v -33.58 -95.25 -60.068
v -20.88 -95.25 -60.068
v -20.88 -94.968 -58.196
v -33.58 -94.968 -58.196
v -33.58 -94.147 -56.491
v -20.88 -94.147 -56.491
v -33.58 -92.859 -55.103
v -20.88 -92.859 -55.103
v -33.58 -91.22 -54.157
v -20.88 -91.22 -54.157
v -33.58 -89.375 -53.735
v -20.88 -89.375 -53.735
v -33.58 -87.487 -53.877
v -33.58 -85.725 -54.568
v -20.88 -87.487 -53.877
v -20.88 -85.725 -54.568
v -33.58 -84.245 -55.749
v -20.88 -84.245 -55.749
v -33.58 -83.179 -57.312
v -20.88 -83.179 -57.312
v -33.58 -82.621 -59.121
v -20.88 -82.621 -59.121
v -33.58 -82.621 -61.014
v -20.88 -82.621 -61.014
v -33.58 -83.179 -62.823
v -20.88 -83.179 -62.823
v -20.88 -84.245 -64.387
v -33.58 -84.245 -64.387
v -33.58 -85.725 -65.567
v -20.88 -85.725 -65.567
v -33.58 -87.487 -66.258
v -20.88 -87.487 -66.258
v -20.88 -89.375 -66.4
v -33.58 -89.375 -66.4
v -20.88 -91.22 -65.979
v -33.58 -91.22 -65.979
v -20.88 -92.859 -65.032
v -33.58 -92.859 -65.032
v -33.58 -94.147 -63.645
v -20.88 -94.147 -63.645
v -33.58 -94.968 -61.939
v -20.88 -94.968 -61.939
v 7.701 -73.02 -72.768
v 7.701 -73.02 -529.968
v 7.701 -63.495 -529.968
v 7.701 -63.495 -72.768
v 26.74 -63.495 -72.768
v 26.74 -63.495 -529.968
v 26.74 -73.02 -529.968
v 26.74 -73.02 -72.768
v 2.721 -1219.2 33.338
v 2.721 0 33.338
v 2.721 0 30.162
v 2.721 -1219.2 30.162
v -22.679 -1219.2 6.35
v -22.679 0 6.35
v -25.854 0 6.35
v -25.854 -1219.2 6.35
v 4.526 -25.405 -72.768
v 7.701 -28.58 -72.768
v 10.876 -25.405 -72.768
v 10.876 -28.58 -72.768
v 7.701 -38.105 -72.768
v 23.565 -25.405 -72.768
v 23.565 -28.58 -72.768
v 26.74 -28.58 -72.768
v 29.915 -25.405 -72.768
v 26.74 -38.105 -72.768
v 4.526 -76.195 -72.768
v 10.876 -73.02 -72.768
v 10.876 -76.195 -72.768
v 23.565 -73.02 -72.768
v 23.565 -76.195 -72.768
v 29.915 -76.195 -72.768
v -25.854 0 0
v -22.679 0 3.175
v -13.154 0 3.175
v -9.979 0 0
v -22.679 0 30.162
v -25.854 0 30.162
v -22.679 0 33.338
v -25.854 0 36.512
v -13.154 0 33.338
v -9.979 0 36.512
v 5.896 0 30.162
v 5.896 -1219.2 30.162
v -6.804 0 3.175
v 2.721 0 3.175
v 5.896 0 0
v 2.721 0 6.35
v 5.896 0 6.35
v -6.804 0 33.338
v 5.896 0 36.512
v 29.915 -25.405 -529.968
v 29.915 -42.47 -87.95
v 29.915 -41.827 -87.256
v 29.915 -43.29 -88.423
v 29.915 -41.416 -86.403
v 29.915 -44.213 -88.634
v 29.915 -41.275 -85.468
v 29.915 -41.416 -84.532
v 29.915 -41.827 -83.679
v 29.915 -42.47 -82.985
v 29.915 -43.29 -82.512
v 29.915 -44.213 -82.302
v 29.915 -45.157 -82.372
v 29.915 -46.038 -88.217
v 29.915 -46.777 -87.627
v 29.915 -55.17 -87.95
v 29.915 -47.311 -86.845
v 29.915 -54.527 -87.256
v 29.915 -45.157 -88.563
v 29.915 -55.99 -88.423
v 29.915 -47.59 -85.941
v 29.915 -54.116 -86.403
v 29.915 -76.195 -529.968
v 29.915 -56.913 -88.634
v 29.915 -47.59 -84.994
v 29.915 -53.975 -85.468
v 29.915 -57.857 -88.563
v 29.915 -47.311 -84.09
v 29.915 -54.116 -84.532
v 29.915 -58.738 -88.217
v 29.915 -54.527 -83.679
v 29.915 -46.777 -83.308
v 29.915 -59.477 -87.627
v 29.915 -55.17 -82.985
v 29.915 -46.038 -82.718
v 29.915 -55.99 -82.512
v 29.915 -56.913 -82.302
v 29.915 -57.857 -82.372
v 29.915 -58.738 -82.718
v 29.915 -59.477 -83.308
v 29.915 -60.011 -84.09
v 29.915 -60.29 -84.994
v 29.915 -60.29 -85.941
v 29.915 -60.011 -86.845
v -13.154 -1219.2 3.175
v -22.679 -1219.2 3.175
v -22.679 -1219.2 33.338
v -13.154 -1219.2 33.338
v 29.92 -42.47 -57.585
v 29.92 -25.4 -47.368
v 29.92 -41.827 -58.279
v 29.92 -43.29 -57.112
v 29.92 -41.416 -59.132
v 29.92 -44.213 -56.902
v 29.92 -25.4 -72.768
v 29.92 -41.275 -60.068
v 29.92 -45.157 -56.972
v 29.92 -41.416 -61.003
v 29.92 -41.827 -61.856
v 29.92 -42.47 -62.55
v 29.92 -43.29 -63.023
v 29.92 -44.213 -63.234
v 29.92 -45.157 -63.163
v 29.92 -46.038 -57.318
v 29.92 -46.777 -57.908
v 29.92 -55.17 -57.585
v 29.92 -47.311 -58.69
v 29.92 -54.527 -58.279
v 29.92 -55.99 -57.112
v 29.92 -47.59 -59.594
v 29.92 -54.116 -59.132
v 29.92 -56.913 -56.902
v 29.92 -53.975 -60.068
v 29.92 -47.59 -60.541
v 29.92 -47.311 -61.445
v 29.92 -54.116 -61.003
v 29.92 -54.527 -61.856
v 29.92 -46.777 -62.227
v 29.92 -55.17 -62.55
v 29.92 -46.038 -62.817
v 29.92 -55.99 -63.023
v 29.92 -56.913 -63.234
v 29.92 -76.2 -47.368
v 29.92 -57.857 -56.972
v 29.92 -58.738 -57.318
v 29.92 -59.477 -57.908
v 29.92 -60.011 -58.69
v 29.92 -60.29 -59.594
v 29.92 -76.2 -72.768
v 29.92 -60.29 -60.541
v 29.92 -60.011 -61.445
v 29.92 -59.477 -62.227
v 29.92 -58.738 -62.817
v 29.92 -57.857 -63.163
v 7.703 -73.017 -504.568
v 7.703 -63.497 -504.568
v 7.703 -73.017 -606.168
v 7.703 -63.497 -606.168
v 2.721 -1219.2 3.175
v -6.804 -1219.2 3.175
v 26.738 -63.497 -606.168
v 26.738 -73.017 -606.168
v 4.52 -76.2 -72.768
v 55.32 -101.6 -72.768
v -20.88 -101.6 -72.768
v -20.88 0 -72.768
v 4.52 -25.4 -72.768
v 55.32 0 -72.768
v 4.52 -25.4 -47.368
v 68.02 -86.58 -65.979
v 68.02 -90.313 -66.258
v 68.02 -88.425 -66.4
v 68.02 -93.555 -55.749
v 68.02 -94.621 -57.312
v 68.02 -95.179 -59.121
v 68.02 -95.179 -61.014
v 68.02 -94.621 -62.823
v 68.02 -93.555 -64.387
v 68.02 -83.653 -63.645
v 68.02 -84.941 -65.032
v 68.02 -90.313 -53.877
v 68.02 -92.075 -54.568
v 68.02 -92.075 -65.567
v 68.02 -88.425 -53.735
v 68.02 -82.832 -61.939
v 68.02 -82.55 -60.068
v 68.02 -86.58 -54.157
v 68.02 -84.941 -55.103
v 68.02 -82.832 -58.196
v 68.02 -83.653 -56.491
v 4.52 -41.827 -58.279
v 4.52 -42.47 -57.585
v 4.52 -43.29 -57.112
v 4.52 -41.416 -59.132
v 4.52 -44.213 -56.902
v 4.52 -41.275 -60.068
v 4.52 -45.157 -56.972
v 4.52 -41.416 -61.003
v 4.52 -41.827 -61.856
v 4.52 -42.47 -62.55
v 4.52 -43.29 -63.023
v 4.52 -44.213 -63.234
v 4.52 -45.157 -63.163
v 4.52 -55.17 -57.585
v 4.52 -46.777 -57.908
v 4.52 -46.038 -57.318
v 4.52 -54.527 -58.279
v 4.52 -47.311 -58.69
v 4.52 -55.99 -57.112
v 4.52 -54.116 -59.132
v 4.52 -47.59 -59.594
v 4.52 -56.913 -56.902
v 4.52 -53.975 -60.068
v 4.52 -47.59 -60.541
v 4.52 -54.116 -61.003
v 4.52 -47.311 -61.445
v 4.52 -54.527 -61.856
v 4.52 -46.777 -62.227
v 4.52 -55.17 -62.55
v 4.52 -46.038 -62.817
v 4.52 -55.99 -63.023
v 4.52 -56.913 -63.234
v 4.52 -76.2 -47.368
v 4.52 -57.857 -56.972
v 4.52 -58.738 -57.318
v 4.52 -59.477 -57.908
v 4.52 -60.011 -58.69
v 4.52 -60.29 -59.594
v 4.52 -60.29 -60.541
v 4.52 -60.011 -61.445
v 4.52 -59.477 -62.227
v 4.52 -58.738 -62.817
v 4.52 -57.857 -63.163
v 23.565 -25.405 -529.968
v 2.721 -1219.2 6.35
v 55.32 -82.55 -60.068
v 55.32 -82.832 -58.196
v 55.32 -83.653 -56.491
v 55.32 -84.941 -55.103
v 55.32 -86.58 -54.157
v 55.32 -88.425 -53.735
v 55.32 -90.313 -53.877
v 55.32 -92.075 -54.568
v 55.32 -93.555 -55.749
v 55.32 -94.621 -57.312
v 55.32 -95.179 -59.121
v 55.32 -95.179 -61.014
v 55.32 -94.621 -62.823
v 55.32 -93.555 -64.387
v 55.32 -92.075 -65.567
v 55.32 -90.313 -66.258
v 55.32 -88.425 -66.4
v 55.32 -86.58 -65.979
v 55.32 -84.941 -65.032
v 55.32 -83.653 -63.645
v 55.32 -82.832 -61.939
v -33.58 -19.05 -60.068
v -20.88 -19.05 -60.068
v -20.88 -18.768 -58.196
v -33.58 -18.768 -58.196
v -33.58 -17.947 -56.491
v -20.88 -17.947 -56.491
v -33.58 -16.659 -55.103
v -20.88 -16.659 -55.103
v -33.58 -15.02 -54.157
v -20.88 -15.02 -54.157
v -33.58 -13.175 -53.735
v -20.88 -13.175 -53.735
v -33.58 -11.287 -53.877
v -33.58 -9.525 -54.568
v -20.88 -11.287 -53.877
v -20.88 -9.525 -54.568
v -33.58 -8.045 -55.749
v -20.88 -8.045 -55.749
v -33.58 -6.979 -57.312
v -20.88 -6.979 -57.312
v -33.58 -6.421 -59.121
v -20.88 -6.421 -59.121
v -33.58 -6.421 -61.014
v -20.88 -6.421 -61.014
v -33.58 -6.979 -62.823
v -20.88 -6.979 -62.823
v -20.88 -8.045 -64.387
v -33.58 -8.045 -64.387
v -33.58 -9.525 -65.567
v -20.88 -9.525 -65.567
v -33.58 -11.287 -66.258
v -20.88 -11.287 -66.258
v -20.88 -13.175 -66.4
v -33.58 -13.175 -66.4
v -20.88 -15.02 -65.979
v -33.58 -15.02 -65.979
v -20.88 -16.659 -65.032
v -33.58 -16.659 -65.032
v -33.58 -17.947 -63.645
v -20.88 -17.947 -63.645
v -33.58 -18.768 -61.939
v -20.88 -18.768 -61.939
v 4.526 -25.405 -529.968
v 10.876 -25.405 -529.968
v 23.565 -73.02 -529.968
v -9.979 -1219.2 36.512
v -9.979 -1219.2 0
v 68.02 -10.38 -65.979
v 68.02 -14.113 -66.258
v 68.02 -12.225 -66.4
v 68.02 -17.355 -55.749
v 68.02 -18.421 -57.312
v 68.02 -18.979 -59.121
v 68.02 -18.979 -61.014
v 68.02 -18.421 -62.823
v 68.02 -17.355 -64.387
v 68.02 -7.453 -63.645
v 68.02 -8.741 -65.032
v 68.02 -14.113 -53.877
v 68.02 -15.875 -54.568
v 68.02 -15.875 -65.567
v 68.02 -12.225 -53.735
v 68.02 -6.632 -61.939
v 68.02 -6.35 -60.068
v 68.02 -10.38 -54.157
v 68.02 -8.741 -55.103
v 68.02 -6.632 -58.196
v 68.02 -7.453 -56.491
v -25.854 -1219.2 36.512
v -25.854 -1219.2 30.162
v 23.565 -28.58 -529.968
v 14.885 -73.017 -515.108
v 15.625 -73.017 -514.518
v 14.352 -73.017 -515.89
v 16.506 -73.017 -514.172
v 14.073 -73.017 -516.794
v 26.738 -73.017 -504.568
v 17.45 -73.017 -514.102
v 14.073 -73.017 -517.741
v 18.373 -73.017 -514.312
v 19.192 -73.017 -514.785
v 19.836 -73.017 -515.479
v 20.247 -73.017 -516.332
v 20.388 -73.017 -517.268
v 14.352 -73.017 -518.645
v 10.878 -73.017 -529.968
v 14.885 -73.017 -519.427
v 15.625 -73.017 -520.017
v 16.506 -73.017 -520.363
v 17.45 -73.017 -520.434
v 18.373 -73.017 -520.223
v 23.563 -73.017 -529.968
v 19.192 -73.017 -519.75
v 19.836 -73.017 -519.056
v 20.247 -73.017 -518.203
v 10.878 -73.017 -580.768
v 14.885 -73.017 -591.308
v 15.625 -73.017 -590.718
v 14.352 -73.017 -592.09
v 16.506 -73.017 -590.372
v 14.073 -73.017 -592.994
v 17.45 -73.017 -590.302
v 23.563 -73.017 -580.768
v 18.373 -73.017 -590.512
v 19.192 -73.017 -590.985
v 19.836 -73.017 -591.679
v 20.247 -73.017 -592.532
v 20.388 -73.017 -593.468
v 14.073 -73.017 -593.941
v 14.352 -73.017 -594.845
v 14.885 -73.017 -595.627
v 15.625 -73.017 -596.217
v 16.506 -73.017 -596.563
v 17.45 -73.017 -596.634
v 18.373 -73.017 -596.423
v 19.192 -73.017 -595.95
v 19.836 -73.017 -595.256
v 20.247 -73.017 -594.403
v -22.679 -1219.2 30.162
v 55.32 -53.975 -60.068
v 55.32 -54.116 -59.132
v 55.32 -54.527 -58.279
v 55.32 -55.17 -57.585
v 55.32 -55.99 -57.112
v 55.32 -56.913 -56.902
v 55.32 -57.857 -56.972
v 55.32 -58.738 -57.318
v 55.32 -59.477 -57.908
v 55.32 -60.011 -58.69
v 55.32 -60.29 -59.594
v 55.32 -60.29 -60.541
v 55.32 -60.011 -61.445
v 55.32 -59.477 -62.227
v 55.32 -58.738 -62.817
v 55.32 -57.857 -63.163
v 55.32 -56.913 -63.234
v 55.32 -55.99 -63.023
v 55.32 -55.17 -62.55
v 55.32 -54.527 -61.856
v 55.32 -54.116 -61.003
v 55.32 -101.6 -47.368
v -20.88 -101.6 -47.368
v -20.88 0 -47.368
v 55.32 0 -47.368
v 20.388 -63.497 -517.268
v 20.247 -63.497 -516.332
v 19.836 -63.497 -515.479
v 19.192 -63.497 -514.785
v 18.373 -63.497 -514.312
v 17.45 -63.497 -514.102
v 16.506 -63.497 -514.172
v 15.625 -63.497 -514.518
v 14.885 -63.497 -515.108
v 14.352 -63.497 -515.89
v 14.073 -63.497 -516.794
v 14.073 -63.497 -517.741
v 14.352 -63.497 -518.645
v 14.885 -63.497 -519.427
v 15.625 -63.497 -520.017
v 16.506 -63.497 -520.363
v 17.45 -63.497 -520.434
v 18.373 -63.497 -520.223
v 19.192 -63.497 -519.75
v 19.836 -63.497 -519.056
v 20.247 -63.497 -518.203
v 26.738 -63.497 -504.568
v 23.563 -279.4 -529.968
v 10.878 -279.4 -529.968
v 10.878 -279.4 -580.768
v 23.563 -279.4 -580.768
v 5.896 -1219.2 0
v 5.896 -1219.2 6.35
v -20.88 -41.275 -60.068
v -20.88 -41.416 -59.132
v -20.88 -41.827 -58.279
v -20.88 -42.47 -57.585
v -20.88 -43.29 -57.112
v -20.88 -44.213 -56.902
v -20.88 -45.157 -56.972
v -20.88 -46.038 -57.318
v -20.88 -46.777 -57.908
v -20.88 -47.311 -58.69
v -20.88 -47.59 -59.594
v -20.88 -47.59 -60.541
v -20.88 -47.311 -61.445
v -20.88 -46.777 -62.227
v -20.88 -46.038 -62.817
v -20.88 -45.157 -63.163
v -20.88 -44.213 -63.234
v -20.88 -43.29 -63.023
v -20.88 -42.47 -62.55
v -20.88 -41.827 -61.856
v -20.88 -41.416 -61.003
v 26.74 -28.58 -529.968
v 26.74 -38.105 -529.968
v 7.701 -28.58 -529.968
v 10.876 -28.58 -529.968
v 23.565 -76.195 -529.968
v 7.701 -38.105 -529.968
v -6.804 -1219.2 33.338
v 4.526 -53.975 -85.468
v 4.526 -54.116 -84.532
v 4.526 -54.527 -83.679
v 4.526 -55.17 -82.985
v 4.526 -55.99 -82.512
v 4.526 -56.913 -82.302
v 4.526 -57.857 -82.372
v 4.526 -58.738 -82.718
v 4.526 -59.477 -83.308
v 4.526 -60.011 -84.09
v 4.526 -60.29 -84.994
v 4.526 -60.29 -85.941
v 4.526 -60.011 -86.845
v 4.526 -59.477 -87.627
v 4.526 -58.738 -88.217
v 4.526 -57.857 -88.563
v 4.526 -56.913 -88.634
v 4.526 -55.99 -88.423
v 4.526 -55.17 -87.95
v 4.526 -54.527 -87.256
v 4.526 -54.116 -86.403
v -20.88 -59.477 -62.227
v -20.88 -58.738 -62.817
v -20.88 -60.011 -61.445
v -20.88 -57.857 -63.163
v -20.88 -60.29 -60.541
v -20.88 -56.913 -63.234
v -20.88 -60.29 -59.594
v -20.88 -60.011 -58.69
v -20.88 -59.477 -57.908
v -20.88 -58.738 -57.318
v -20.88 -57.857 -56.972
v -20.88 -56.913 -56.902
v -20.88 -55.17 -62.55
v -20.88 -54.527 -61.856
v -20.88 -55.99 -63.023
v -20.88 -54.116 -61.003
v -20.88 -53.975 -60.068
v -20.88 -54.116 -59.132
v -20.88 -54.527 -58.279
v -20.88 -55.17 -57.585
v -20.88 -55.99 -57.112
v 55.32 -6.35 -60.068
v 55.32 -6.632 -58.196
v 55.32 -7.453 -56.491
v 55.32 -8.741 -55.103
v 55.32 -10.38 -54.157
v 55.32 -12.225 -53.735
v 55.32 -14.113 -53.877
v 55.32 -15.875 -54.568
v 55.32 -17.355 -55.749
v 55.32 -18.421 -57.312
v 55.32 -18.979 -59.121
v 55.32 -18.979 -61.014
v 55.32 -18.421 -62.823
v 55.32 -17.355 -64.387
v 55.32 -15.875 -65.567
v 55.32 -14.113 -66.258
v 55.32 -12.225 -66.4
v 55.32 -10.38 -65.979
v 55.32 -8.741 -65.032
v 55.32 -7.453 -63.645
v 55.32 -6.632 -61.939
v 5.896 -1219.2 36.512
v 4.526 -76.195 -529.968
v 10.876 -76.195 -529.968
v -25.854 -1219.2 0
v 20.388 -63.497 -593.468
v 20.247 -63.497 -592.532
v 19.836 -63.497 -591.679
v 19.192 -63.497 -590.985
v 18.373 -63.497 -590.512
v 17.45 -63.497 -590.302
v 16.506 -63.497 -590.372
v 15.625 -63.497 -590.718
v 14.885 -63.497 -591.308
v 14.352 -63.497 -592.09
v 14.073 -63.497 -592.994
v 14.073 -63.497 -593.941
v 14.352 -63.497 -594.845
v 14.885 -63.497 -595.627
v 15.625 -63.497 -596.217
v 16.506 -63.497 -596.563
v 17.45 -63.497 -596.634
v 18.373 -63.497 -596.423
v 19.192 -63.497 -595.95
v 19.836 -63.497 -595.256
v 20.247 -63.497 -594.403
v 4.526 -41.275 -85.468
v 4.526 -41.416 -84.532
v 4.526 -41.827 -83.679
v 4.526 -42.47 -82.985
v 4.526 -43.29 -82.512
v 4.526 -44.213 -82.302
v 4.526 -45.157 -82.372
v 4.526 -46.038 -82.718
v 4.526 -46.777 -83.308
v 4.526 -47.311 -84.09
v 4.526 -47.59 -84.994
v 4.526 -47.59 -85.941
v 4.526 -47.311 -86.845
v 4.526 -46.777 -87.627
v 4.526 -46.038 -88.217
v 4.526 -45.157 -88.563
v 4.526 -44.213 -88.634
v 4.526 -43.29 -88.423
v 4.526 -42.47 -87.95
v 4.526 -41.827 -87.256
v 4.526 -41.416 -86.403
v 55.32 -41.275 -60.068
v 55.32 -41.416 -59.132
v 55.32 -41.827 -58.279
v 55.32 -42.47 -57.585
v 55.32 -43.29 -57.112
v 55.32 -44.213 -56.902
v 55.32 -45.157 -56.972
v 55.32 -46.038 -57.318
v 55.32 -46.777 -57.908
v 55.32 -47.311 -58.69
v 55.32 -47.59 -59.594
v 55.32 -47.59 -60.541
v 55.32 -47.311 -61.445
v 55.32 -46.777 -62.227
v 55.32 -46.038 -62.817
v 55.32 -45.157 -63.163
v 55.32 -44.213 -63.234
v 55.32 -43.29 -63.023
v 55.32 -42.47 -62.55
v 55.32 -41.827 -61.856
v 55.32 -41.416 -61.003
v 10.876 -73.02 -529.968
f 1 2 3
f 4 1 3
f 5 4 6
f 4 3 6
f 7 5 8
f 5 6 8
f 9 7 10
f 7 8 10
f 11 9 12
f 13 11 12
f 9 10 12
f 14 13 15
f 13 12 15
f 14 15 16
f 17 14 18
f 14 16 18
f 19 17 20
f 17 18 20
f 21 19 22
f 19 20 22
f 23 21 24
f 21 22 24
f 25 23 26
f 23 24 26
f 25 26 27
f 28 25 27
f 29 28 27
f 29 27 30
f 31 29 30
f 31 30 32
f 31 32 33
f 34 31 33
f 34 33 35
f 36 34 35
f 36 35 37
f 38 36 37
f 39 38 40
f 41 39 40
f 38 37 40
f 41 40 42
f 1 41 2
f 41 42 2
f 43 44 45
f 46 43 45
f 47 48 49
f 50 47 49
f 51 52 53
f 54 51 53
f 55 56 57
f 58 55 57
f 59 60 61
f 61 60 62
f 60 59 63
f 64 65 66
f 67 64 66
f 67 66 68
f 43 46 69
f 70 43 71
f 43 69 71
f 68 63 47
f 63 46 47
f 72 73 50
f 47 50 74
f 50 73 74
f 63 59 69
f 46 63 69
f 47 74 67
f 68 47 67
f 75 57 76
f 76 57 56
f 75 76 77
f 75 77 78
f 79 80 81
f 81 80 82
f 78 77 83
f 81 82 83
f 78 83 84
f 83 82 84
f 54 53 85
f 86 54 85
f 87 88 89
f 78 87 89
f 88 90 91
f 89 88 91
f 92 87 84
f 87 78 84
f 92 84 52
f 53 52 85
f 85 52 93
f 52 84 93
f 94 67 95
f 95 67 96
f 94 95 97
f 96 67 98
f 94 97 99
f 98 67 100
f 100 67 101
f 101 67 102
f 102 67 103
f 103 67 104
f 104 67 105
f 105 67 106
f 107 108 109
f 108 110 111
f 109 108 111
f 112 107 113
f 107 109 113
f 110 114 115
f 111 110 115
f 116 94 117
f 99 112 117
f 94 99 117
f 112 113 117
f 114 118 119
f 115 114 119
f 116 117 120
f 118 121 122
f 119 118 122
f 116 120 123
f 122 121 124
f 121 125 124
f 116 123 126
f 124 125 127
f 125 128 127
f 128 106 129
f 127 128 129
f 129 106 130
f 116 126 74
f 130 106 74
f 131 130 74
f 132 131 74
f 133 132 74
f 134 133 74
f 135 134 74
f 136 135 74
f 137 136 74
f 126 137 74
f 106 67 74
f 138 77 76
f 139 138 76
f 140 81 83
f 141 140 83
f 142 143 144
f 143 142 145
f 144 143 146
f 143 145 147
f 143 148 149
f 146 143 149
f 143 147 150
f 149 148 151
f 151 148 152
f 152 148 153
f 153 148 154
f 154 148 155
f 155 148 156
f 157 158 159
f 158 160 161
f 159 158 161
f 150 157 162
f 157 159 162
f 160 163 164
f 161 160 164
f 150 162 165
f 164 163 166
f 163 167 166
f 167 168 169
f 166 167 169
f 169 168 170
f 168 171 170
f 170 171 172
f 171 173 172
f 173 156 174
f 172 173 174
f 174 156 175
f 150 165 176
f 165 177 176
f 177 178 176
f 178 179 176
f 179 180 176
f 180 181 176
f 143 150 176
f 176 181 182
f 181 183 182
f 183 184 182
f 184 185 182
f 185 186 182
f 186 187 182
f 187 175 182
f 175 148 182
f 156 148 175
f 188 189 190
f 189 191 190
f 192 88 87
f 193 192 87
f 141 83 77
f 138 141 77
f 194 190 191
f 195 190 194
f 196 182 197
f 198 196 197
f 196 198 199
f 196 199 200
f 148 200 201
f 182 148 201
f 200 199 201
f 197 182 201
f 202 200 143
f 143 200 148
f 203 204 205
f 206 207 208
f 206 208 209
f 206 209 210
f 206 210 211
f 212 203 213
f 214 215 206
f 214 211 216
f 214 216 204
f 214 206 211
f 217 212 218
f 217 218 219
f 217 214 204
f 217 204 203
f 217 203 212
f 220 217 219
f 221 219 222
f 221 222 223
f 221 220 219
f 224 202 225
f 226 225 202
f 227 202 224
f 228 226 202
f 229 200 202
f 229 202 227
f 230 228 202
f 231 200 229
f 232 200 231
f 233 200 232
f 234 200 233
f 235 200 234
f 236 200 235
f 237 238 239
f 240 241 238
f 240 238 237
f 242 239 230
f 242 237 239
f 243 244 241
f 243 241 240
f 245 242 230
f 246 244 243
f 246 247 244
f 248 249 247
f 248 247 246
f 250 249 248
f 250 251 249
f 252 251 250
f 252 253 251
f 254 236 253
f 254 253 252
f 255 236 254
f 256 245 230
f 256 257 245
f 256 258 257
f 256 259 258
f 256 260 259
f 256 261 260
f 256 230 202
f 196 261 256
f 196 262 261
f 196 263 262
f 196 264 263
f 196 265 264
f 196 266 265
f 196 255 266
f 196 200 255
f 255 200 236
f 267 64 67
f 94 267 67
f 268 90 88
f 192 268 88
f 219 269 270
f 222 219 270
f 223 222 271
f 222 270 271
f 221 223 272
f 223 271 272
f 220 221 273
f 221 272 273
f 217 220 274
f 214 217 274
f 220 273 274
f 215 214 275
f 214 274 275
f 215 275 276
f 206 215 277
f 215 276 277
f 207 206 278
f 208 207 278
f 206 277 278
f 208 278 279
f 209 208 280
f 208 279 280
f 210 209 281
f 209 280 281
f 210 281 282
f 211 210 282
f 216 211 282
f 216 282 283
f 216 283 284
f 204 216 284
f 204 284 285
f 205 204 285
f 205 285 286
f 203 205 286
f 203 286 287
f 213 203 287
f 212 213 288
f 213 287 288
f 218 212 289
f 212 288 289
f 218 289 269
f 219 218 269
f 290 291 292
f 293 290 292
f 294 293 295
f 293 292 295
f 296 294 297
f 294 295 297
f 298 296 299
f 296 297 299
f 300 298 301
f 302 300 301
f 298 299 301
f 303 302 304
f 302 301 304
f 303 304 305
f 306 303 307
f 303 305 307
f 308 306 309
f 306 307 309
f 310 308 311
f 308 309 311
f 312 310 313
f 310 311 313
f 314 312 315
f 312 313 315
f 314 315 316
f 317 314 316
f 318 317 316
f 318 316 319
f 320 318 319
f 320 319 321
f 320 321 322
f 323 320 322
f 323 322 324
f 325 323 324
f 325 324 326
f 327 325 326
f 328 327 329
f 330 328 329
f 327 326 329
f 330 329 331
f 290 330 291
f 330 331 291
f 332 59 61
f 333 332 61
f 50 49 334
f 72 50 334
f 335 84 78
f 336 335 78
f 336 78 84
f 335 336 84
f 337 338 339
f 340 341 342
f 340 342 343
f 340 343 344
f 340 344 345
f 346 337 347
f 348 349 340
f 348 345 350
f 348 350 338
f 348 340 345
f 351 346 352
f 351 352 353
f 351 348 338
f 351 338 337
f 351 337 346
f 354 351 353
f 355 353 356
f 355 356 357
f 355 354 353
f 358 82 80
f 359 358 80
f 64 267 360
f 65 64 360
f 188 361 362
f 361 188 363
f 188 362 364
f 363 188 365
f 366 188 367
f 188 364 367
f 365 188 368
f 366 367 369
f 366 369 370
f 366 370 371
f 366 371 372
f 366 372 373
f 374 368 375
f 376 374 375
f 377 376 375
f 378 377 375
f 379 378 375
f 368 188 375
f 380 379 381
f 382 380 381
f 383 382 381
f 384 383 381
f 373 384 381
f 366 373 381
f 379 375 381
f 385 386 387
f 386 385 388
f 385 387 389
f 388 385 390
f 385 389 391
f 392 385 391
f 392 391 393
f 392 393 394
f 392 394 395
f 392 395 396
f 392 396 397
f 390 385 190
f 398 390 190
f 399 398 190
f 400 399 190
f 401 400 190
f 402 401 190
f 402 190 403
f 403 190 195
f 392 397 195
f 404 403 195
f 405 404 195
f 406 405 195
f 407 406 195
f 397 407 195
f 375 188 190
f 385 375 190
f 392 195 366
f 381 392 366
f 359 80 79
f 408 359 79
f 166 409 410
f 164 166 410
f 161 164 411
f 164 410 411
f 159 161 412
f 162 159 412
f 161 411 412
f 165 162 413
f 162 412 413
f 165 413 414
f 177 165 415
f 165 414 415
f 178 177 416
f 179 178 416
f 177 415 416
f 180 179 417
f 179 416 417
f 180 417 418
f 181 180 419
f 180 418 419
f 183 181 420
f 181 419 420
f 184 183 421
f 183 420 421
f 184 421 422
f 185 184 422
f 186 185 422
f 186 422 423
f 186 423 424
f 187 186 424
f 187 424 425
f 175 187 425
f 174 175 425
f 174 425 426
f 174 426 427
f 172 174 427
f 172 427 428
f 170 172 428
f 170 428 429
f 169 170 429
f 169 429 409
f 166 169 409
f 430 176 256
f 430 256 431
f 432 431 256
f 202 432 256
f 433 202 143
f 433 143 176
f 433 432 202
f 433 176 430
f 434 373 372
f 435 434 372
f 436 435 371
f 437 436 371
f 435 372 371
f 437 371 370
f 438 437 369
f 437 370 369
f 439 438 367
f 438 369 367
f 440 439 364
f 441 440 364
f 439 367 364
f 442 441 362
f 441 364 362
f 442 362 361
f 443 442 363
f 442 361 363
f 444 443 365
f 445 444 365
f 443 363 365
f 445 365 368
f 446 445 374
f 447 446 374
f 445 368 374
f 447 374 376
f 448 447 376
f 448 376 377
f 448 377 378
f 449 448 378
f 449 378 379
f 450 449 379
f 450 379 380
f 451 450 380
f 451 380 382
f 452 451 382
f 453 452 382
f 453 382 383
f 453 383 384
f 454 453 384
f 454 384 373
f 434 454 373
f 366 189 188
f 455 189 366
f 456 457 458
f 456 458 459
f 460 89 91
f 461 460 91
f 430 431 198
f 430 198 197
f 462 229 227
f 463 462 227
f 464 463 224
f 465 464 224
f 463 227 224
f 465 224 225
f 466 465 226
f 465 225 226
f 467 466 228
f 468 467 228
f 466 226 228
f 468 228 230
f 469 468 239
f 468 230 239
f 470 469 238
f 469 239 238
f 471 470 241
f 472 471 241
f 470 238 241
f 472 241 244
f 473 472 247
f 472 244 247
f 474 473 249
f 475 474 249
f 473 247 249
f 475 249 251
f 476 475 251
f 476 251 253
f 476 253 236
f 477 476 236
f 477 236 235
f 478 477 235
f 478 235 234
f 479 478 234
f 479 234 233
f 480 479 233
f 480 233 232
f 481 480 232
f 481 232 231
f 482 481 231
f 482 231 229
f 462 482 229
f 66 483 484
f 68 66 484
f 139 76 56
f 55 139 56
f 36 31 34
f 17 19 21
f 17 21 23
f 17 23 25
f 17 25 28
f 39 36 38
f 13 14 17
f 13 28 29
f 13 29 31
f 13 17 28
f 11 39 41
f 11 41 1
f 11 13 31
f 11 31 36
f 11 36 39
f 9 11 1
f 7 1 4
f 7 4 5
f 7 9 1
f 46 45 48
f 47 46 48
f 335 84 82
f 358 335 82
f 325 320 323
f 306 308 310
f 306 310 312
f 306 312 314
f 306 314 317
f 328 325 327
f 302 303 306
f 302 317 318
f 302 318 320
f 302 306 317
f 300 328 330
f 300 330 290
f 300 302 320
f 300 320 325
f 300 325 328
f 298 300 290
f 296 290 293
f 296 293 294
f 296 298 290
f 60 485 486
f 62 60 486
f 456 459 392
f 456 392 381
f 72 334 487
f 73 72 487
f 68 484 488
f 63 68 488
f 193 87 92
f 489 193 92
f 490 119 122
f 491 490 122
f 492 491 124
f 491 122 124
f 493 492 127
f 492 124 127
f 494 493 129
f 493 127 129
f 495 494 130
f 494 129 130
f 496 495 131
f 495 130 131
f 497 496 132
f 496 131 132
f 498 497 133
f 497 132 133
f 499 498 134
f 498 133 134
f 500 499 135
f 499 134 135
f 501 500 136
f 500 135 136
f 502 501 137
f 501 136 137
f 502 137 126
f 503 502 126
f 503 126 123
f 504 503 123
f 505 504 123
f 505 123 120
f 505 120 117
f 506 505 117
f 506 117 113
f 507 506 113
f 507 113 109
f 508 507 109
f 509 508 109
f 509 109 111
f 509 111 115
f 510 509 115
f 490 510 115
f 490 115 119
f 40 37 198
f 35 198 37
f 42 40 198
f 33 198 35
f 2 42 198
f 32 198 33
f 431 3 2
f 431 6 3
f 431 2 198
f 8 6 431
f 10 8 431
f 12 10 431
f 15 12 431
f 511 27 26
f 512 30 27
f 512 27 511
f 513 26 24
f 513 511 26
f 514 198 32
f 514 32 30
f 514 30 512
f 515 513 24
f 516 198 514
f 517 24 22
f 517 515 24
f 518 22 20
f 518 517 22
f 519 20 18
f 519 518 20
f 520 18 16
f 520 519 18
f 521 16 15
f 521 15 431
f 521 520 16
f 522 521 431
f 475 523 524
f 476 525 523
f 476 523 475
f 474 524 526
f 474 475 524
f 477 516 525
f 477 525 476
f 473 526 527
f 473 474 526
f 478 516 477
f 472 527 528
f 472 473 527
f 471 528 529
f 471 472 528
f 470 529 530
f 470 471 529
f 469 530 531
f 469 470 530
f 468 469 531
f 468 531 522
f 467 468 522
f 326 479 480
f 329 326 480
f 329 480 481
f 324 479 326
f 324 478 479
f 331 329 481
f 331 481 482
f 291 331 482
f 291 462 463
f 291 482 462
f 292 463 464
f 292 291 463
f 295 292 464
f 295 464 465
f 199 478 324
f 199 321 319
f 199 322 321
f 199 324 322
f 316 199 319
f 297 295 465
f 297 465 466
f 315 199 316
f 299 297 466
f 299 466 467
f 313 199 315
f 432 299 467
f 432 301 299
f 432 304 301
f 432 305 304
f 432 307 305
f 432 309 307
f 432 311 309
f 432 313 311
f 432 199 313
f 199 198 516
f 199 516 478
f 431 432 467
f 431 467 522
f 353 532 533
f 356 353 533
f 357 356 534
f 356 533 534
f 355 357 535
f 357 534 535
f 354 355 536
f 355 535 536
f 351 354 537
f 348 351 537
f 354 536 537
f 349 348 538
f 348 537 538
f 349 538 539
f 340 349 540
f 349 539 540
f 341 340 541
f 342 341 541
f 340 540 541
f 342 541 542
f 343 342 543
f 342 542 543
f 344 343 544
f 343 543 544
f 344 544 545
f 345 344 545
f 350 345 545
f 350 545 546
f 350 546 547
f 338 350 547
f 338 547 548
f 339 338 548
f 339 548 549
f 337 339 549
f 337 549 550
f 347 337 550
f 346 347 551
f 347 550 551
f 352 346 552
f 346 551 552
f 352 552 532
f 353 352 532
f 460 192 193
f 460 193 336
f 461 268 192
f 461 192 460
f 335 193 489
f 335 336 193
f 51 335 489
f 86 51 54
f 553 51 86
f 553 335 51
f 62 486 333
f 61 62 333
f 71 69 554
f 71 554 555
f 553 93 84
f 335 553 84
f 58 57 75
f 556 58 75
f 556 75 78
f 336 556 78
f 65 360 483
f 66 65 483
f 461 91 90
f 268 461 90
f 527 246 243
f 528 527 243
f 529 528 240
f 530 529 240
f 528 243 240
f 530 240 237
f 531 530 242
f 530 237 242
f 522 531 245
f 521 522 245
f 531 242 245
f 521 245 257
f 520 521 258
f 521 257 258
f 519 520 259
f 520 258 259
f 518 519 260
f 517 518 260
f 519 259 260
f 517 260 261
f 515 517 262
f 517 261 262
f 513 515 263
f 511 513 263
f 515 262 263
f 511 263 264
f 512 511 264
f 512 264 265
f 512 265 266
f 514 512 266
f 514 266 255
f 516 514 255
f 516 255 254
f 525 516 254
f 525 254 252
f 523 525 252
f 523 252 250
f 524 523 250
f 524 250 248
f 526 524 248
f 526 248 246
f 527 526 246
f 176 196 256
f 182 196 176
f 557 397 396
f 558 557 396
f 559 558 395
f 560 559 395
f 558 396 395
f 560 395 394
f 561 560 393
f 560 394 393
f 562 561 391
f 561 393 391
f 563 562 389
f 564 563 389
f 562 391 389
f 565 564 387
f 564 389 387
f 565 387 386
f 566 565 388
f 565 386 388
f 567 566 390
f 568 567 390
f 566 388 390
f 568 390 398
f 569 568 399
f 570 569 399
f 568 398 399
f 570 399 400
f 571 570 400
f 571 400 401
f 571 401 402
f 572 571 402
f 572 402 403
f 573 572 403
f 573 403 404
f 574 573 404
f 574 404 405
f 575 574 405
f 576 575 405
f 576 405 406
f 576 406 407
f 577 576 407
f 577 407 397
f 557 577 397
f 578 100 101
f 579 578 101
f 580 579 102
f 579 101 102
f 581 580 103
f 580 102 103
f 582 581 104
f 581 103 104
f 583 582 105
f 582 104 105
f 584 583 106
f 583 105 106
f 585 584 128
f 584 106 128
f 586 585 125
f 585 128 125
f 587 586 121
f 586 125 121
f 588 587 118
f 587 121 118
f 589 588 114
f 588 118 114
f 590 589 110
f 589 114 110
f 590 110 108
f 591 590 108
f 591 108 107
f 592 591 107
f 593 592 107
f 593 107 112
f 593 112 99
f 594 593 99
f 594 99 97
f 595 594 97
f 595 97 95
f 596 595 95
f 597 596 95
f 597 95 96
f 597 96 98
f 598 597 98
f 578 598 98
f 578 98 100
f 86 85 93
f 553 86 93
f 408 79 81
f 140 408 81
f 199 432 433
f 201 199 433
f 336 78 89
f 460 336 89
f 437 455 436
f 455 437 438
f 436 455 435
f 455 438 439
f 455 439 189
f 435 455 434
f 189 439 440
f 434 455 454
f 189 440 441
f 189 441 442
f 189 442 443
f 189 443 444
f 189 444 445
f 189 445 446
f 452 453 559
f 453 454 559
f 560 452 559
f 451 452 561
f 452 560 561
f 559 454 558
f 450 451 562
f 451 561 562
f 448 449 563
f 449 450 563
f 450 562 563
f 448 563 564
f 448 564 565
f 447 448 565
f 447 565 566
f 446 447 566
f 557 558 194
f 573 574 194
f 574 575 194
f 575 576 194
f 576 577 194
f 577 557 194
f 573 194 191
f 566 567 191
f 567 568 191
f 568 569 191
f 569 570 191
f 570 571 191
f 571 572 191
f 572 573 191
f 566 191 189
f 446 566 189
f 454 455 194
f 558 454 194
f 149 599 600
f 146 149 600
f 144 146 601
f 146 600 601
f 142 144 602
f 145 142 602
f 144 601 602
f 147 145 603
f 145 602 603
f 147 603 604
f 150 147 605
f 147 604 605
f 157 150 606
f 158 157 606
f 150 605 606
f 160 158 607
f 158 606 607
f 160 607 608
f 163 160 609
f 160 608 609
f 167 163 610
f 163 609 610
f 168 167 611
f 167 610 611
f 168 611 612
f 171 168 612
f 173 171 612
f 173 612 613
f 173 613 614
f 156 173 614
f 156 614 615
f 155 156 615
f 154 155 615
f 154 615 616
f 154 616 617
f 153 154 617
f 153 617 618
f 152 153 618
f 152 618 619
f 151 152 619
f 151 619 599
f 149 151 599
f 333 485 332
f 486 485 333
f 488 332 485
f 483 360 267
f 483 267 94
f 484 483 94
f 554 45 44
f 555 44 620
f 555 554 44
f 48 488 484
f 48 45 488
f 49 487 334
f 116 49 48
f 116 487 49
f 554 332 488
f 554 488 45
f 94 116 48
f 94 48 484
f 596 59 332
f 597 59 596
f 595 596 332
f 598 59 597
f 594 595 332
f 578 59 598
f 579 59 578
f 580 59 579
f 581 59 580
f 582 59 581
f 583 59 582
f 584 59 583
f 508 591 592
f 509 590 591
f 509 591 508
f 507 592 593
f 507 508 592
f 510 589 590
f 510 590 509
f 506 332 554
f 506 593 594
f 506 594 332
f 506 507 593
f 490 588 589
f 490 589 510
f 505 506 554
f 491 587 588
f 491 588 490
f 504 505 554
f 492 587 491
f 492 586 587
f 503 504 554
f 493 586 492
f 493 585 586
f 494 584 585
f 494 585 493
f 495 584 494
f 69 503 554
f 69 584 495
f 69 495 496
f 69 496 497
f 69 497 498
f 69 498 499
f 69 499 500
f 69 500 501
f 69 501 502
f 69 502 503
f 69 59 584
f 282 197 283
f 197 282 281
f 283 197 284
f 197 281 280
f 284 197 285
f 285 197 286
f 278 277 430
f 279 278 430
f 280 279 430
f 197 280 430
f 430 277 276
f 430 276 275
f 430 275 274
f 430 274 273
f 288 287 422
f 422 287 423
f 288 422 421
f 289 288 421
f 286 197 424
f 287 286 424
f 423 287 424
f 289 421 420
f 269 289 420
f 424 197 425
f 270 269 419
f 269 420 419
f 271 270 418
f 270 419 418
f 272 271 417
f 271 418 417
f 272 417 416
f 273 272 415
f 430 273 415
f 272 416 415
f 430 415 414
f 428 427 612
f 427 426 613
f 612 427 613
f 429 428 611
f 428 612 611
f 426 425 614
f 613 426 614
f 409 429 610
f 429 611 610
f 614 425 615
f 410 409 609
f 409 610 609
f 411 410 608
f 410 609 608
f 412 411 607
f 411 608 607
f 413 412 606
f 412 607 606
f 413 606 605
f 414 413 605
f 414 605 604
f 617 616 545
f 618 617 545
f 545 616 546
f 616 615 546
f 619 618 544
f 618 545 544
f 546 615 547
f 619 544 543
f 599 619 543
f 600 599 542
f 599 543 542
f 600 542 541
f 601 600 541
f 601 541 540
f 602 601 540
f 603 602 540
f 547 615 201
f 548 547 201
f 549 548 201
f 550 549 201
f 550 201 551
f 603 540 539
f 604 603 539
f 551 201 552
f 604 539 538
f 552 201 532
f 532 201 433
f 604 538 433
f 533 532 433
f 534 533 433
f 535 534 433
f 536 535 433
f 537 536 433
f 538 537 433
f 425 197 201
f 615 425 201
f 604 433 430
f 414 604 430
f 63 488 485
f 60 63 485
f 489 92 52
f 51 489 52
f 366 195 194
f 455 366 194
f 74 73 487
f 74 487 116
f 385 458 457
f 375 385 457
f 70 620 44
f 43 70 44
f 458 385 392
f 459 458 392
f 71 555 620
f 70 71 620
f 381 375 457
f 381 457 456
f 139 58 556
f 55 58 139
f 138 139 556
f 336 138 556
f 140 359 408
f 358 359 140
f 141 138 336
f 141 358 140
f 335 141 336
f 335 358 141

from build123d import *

# Parameters (mm, degrees)
F1_DEPTH  = 1219.2
F2_DEPTH  = 1219.2
F3_W      = 76.2
F3_H      = 25.4
F4_DEPTH  = 101.6
F5_R      = 6.35
F6_DEPTH  = 12.7
F7_R      = 6.35
F8_DEPTH  = 12.7
F9_W      = 25.4
F9_H      = 50.8
F10_DEPTH = 25.4
F11_R     = 3.175
F12_DEPTH = 88.901
F13_W     = 25.38984
F13_H     = 50.78984
F14_DEPTH = 457.2
F16_DEPTH = 566.481141426
F17_R     = 3.175
F18_DEPTH = 63.49592
F20_DEPTH = 50.8
F21_W     = 12.68476
F21_H     = 50.8
F22_DEPTH = 203.2
F24_DEPTH = 25.4
F26_DEPTH = 25.4
F27_R     = 3.175
F28_DEPTH = 73.01838


with BuildPart() as f1:
    # F0 (on Front) → F1 (new body)
    with BuildSketch(Plane.XZ):
        Polygon((-25.8535564797, 36.5125), (-25.8535564797, 30.1625), (-22.6785564797, 30.1625), (-22.6785564797, 33.3375), (-13.1535564797, 33.3375), (-13.1535564797, 3.175), (-22.6785564797, 3.175), (-22.6785564797, 6.35), (-25.8535564797, 6.35), (-25.8535564797, 0), (-9.9785564797, 0), (-9.9785564797, 36.5125), align=None)
    extrude(amount=F1_DEPTH)


with BuildPart() as f2:
    # F0 (on Front) → F2 (new body)
    with BuildSketch(Plane.XZ):
        Polygon((5.8964435203, 36.5125), (-9.9785564797, 36.5125), (-9.9785564797, 0), (5.8964435203, 0), (5.8964435203, 6.35), (2.7214435203, 6.35), (2.7214435203, 3.175), (-6.8035564797, 3.175), (-6.8035564797, 33.3375), (2.7214435203, 33.3375), (2.7214435203, 30.1625), (5.8964435203, 30.1625), align=None)
    extrude(amount=F2_DEPTH)


with BuildPart() as f4:
    # F3 (on Front) → F4 (new body)
    with BuildSketch(Plane.XZ):
        with Locations((17.2204952687, -60.067641426)):
            Rectangle(F3_W, F3_H)
    extrude(amount=F4_DEPTH)

    # F5 (on face) → F6 (join)
    with BuildSketch(Plane.YZ.offset(55.3204952687)):
        with Locations((-88.9, -60.067641426)):
            Circle(F5_R)
        with Locations((-12.7, -60.067641426)):
            Circle(F5_R)
    extrude(amount=F6_DEPTH)

    # F7 (on face) → F8 (join)
    with BuildSketch(Plane(origin=(-20.8795047313, 0, 0), x_dir=(0, -1, 0), z_dir=(-1, 0, 0))):
        with Locations((12.7, -60.067641426)):
            Circle(F7_R)
        with Locations((88.9, -60.067641426)):
            Circle(F7_R)
    extrude(amount=F8_DEPTH)

    # F9 (on face) → F10 (cut)
    with BuildSketch(Plane(origin=(0, 0, -72.767641426), x_dir=(1, 0, 0), z_dir=(0, 0, -1))):
        with Locations((17.2204952687, 50.8)):
            Rectangle(F9_W, F9_H)
    extrude(amount=-F10_DEPTH, mode=Mode.SUBTRACT)

    # F11 (on face) → F12 (cut, through all)
    with BuildSketch(Plane.YZ.offset(55.3204952687)):
        with Locations((-57.15, -60.067641426)):
            Circle(F11_R)
        with Locations((-44.45, -60.067641426)):
            Circle(F11_R)
    extrude(amount=-F12_DEPTH, mode=Mode.SUBTRACT)


with BuildPart() as f14:
    # F13 (on face) → F14 (new body)
    with BuildSketch(Plane(origin=(0, 0, -72.767641426), x_dir=(1, 0, 0), z_dir=(0, 0, -1))):
        with Locations((17.2204952687, 50.8)):
            Rectangle(F13_W, F13_H)
    extrude(amount=F14_DEPTH)

    # F15 (on face) → F16 (cut, through all)
    with BuildSketch(Plane(origin=(0, 0, -529.967641426), x_dir=(1, 0, 0), z_dir=(0, 0, -1))):
        Polygon((23.5654152687, 73.01992), (23.5654152687, 76.19492), (10.8755752687, 76.19492), (10.8755752687, 73.01992), (7.7005752687, 73.01992), (7.7005752687, 63.49492), (26.7404152687, 63.49492), (26.7404152687, 73.01992), align=None)
        Polygon((10.8755752687, 25.40508), (23.5654152687, 25.40508), (23.5654152687, 28.58008), (26.7404152687, 28.58008), (26.7404152687, 38.10508), (7.7005752687, 38.10508), (7.7005752687, 28.58008), (10.8755752687, 28.58008), align=None)
    extrude(amount=-F16_DEPTH, mode=Mode.SUBTRACT)

    # F17 (on face) → F18 (cut, through all)
    with BuildSketch(Plane.YZ.offset(29.9154152687)):
        with Locations((-57.15, -85.467641426)):
            Circle(F17_R)
        with Locations((-44.45, -85.467641426)):
            Circle(F17_R)
    extrude(amount=-F18_DEPTH, mode=Mode.SUBTRACT)


with BuildPart() as f20:
    # F19 (on face) → F20 (new body)
    with BuildSketch(Plane(origin=(0, 0, -529.967641426), x_dir=(1, 0, 0), z_dir=(0, 0, -1))):
        Polygon((23.5628752687, 73.01738), (23.5628752687, 76.2), (10.8781152687, 76.2), (10.8781152687, 73.01738), (7.7031152687, 73.01738), (7.7031152687, 63.49746), (26.7378752687, 63.49746), (26.7378752687, 73.01738), align=None)
    extrude(amount=F20_DEPTH)

    # F21 (on face) → F22 (join)
    with BuildSketch(Plane.XZ.offset(76.2)):
        with Locations((17.2204952687, -555.367641426)):
            Rectangle(F21_W, F21_H)
    extrude(amount=F22_DEPTH)

    # F23 (on face) → F24 (join)
    with BuildSketch(Plane(origin=(0, 0, -580.767641426), x_dir=(1, 0, 0), z_dir=(0, 0, -1))):
        Polygon((26.7378752687, 63.49746), (26.7378752687, 73.01738), (23.5628752687, 73.01738), (10.8781152687, 73.01738), (7.7031152687, 73.01738), (7.7031152687, 63.49746), align=None)
    extrude(amount=F24_DEPTH)

    # F25 (on face) → F26 (join)
    with BuildSketch(Plane.XY.offset(-529.967641426)):
        Polygon((23.5628752687, -73.01738), (26.7378752687, -73.01738), (26.7378752687, -63.49746), (7.7031152687, -63.49746), (7.7031152687, -73.01738), (10.8781152687, -73.01738), align=None)
    extrude(amount=F26_DEPTH)

    # F27 (on face) → F28 (cut, through all)
    with BuildSketch(Plane.XZ.offset(73.01738)):
        with Locations((17.2128752687, -517.267641426)):
            Circle(F27_R)
        with Locations((17.2128752687, -593.467641426)):
            Circle(F27_R)
    extrude(amount=-F28_DEPTH, mode=Mode.SUBTRACT)


solid = Compound([f1.part, f2.part, f4.part, f14.part, f20.part])
